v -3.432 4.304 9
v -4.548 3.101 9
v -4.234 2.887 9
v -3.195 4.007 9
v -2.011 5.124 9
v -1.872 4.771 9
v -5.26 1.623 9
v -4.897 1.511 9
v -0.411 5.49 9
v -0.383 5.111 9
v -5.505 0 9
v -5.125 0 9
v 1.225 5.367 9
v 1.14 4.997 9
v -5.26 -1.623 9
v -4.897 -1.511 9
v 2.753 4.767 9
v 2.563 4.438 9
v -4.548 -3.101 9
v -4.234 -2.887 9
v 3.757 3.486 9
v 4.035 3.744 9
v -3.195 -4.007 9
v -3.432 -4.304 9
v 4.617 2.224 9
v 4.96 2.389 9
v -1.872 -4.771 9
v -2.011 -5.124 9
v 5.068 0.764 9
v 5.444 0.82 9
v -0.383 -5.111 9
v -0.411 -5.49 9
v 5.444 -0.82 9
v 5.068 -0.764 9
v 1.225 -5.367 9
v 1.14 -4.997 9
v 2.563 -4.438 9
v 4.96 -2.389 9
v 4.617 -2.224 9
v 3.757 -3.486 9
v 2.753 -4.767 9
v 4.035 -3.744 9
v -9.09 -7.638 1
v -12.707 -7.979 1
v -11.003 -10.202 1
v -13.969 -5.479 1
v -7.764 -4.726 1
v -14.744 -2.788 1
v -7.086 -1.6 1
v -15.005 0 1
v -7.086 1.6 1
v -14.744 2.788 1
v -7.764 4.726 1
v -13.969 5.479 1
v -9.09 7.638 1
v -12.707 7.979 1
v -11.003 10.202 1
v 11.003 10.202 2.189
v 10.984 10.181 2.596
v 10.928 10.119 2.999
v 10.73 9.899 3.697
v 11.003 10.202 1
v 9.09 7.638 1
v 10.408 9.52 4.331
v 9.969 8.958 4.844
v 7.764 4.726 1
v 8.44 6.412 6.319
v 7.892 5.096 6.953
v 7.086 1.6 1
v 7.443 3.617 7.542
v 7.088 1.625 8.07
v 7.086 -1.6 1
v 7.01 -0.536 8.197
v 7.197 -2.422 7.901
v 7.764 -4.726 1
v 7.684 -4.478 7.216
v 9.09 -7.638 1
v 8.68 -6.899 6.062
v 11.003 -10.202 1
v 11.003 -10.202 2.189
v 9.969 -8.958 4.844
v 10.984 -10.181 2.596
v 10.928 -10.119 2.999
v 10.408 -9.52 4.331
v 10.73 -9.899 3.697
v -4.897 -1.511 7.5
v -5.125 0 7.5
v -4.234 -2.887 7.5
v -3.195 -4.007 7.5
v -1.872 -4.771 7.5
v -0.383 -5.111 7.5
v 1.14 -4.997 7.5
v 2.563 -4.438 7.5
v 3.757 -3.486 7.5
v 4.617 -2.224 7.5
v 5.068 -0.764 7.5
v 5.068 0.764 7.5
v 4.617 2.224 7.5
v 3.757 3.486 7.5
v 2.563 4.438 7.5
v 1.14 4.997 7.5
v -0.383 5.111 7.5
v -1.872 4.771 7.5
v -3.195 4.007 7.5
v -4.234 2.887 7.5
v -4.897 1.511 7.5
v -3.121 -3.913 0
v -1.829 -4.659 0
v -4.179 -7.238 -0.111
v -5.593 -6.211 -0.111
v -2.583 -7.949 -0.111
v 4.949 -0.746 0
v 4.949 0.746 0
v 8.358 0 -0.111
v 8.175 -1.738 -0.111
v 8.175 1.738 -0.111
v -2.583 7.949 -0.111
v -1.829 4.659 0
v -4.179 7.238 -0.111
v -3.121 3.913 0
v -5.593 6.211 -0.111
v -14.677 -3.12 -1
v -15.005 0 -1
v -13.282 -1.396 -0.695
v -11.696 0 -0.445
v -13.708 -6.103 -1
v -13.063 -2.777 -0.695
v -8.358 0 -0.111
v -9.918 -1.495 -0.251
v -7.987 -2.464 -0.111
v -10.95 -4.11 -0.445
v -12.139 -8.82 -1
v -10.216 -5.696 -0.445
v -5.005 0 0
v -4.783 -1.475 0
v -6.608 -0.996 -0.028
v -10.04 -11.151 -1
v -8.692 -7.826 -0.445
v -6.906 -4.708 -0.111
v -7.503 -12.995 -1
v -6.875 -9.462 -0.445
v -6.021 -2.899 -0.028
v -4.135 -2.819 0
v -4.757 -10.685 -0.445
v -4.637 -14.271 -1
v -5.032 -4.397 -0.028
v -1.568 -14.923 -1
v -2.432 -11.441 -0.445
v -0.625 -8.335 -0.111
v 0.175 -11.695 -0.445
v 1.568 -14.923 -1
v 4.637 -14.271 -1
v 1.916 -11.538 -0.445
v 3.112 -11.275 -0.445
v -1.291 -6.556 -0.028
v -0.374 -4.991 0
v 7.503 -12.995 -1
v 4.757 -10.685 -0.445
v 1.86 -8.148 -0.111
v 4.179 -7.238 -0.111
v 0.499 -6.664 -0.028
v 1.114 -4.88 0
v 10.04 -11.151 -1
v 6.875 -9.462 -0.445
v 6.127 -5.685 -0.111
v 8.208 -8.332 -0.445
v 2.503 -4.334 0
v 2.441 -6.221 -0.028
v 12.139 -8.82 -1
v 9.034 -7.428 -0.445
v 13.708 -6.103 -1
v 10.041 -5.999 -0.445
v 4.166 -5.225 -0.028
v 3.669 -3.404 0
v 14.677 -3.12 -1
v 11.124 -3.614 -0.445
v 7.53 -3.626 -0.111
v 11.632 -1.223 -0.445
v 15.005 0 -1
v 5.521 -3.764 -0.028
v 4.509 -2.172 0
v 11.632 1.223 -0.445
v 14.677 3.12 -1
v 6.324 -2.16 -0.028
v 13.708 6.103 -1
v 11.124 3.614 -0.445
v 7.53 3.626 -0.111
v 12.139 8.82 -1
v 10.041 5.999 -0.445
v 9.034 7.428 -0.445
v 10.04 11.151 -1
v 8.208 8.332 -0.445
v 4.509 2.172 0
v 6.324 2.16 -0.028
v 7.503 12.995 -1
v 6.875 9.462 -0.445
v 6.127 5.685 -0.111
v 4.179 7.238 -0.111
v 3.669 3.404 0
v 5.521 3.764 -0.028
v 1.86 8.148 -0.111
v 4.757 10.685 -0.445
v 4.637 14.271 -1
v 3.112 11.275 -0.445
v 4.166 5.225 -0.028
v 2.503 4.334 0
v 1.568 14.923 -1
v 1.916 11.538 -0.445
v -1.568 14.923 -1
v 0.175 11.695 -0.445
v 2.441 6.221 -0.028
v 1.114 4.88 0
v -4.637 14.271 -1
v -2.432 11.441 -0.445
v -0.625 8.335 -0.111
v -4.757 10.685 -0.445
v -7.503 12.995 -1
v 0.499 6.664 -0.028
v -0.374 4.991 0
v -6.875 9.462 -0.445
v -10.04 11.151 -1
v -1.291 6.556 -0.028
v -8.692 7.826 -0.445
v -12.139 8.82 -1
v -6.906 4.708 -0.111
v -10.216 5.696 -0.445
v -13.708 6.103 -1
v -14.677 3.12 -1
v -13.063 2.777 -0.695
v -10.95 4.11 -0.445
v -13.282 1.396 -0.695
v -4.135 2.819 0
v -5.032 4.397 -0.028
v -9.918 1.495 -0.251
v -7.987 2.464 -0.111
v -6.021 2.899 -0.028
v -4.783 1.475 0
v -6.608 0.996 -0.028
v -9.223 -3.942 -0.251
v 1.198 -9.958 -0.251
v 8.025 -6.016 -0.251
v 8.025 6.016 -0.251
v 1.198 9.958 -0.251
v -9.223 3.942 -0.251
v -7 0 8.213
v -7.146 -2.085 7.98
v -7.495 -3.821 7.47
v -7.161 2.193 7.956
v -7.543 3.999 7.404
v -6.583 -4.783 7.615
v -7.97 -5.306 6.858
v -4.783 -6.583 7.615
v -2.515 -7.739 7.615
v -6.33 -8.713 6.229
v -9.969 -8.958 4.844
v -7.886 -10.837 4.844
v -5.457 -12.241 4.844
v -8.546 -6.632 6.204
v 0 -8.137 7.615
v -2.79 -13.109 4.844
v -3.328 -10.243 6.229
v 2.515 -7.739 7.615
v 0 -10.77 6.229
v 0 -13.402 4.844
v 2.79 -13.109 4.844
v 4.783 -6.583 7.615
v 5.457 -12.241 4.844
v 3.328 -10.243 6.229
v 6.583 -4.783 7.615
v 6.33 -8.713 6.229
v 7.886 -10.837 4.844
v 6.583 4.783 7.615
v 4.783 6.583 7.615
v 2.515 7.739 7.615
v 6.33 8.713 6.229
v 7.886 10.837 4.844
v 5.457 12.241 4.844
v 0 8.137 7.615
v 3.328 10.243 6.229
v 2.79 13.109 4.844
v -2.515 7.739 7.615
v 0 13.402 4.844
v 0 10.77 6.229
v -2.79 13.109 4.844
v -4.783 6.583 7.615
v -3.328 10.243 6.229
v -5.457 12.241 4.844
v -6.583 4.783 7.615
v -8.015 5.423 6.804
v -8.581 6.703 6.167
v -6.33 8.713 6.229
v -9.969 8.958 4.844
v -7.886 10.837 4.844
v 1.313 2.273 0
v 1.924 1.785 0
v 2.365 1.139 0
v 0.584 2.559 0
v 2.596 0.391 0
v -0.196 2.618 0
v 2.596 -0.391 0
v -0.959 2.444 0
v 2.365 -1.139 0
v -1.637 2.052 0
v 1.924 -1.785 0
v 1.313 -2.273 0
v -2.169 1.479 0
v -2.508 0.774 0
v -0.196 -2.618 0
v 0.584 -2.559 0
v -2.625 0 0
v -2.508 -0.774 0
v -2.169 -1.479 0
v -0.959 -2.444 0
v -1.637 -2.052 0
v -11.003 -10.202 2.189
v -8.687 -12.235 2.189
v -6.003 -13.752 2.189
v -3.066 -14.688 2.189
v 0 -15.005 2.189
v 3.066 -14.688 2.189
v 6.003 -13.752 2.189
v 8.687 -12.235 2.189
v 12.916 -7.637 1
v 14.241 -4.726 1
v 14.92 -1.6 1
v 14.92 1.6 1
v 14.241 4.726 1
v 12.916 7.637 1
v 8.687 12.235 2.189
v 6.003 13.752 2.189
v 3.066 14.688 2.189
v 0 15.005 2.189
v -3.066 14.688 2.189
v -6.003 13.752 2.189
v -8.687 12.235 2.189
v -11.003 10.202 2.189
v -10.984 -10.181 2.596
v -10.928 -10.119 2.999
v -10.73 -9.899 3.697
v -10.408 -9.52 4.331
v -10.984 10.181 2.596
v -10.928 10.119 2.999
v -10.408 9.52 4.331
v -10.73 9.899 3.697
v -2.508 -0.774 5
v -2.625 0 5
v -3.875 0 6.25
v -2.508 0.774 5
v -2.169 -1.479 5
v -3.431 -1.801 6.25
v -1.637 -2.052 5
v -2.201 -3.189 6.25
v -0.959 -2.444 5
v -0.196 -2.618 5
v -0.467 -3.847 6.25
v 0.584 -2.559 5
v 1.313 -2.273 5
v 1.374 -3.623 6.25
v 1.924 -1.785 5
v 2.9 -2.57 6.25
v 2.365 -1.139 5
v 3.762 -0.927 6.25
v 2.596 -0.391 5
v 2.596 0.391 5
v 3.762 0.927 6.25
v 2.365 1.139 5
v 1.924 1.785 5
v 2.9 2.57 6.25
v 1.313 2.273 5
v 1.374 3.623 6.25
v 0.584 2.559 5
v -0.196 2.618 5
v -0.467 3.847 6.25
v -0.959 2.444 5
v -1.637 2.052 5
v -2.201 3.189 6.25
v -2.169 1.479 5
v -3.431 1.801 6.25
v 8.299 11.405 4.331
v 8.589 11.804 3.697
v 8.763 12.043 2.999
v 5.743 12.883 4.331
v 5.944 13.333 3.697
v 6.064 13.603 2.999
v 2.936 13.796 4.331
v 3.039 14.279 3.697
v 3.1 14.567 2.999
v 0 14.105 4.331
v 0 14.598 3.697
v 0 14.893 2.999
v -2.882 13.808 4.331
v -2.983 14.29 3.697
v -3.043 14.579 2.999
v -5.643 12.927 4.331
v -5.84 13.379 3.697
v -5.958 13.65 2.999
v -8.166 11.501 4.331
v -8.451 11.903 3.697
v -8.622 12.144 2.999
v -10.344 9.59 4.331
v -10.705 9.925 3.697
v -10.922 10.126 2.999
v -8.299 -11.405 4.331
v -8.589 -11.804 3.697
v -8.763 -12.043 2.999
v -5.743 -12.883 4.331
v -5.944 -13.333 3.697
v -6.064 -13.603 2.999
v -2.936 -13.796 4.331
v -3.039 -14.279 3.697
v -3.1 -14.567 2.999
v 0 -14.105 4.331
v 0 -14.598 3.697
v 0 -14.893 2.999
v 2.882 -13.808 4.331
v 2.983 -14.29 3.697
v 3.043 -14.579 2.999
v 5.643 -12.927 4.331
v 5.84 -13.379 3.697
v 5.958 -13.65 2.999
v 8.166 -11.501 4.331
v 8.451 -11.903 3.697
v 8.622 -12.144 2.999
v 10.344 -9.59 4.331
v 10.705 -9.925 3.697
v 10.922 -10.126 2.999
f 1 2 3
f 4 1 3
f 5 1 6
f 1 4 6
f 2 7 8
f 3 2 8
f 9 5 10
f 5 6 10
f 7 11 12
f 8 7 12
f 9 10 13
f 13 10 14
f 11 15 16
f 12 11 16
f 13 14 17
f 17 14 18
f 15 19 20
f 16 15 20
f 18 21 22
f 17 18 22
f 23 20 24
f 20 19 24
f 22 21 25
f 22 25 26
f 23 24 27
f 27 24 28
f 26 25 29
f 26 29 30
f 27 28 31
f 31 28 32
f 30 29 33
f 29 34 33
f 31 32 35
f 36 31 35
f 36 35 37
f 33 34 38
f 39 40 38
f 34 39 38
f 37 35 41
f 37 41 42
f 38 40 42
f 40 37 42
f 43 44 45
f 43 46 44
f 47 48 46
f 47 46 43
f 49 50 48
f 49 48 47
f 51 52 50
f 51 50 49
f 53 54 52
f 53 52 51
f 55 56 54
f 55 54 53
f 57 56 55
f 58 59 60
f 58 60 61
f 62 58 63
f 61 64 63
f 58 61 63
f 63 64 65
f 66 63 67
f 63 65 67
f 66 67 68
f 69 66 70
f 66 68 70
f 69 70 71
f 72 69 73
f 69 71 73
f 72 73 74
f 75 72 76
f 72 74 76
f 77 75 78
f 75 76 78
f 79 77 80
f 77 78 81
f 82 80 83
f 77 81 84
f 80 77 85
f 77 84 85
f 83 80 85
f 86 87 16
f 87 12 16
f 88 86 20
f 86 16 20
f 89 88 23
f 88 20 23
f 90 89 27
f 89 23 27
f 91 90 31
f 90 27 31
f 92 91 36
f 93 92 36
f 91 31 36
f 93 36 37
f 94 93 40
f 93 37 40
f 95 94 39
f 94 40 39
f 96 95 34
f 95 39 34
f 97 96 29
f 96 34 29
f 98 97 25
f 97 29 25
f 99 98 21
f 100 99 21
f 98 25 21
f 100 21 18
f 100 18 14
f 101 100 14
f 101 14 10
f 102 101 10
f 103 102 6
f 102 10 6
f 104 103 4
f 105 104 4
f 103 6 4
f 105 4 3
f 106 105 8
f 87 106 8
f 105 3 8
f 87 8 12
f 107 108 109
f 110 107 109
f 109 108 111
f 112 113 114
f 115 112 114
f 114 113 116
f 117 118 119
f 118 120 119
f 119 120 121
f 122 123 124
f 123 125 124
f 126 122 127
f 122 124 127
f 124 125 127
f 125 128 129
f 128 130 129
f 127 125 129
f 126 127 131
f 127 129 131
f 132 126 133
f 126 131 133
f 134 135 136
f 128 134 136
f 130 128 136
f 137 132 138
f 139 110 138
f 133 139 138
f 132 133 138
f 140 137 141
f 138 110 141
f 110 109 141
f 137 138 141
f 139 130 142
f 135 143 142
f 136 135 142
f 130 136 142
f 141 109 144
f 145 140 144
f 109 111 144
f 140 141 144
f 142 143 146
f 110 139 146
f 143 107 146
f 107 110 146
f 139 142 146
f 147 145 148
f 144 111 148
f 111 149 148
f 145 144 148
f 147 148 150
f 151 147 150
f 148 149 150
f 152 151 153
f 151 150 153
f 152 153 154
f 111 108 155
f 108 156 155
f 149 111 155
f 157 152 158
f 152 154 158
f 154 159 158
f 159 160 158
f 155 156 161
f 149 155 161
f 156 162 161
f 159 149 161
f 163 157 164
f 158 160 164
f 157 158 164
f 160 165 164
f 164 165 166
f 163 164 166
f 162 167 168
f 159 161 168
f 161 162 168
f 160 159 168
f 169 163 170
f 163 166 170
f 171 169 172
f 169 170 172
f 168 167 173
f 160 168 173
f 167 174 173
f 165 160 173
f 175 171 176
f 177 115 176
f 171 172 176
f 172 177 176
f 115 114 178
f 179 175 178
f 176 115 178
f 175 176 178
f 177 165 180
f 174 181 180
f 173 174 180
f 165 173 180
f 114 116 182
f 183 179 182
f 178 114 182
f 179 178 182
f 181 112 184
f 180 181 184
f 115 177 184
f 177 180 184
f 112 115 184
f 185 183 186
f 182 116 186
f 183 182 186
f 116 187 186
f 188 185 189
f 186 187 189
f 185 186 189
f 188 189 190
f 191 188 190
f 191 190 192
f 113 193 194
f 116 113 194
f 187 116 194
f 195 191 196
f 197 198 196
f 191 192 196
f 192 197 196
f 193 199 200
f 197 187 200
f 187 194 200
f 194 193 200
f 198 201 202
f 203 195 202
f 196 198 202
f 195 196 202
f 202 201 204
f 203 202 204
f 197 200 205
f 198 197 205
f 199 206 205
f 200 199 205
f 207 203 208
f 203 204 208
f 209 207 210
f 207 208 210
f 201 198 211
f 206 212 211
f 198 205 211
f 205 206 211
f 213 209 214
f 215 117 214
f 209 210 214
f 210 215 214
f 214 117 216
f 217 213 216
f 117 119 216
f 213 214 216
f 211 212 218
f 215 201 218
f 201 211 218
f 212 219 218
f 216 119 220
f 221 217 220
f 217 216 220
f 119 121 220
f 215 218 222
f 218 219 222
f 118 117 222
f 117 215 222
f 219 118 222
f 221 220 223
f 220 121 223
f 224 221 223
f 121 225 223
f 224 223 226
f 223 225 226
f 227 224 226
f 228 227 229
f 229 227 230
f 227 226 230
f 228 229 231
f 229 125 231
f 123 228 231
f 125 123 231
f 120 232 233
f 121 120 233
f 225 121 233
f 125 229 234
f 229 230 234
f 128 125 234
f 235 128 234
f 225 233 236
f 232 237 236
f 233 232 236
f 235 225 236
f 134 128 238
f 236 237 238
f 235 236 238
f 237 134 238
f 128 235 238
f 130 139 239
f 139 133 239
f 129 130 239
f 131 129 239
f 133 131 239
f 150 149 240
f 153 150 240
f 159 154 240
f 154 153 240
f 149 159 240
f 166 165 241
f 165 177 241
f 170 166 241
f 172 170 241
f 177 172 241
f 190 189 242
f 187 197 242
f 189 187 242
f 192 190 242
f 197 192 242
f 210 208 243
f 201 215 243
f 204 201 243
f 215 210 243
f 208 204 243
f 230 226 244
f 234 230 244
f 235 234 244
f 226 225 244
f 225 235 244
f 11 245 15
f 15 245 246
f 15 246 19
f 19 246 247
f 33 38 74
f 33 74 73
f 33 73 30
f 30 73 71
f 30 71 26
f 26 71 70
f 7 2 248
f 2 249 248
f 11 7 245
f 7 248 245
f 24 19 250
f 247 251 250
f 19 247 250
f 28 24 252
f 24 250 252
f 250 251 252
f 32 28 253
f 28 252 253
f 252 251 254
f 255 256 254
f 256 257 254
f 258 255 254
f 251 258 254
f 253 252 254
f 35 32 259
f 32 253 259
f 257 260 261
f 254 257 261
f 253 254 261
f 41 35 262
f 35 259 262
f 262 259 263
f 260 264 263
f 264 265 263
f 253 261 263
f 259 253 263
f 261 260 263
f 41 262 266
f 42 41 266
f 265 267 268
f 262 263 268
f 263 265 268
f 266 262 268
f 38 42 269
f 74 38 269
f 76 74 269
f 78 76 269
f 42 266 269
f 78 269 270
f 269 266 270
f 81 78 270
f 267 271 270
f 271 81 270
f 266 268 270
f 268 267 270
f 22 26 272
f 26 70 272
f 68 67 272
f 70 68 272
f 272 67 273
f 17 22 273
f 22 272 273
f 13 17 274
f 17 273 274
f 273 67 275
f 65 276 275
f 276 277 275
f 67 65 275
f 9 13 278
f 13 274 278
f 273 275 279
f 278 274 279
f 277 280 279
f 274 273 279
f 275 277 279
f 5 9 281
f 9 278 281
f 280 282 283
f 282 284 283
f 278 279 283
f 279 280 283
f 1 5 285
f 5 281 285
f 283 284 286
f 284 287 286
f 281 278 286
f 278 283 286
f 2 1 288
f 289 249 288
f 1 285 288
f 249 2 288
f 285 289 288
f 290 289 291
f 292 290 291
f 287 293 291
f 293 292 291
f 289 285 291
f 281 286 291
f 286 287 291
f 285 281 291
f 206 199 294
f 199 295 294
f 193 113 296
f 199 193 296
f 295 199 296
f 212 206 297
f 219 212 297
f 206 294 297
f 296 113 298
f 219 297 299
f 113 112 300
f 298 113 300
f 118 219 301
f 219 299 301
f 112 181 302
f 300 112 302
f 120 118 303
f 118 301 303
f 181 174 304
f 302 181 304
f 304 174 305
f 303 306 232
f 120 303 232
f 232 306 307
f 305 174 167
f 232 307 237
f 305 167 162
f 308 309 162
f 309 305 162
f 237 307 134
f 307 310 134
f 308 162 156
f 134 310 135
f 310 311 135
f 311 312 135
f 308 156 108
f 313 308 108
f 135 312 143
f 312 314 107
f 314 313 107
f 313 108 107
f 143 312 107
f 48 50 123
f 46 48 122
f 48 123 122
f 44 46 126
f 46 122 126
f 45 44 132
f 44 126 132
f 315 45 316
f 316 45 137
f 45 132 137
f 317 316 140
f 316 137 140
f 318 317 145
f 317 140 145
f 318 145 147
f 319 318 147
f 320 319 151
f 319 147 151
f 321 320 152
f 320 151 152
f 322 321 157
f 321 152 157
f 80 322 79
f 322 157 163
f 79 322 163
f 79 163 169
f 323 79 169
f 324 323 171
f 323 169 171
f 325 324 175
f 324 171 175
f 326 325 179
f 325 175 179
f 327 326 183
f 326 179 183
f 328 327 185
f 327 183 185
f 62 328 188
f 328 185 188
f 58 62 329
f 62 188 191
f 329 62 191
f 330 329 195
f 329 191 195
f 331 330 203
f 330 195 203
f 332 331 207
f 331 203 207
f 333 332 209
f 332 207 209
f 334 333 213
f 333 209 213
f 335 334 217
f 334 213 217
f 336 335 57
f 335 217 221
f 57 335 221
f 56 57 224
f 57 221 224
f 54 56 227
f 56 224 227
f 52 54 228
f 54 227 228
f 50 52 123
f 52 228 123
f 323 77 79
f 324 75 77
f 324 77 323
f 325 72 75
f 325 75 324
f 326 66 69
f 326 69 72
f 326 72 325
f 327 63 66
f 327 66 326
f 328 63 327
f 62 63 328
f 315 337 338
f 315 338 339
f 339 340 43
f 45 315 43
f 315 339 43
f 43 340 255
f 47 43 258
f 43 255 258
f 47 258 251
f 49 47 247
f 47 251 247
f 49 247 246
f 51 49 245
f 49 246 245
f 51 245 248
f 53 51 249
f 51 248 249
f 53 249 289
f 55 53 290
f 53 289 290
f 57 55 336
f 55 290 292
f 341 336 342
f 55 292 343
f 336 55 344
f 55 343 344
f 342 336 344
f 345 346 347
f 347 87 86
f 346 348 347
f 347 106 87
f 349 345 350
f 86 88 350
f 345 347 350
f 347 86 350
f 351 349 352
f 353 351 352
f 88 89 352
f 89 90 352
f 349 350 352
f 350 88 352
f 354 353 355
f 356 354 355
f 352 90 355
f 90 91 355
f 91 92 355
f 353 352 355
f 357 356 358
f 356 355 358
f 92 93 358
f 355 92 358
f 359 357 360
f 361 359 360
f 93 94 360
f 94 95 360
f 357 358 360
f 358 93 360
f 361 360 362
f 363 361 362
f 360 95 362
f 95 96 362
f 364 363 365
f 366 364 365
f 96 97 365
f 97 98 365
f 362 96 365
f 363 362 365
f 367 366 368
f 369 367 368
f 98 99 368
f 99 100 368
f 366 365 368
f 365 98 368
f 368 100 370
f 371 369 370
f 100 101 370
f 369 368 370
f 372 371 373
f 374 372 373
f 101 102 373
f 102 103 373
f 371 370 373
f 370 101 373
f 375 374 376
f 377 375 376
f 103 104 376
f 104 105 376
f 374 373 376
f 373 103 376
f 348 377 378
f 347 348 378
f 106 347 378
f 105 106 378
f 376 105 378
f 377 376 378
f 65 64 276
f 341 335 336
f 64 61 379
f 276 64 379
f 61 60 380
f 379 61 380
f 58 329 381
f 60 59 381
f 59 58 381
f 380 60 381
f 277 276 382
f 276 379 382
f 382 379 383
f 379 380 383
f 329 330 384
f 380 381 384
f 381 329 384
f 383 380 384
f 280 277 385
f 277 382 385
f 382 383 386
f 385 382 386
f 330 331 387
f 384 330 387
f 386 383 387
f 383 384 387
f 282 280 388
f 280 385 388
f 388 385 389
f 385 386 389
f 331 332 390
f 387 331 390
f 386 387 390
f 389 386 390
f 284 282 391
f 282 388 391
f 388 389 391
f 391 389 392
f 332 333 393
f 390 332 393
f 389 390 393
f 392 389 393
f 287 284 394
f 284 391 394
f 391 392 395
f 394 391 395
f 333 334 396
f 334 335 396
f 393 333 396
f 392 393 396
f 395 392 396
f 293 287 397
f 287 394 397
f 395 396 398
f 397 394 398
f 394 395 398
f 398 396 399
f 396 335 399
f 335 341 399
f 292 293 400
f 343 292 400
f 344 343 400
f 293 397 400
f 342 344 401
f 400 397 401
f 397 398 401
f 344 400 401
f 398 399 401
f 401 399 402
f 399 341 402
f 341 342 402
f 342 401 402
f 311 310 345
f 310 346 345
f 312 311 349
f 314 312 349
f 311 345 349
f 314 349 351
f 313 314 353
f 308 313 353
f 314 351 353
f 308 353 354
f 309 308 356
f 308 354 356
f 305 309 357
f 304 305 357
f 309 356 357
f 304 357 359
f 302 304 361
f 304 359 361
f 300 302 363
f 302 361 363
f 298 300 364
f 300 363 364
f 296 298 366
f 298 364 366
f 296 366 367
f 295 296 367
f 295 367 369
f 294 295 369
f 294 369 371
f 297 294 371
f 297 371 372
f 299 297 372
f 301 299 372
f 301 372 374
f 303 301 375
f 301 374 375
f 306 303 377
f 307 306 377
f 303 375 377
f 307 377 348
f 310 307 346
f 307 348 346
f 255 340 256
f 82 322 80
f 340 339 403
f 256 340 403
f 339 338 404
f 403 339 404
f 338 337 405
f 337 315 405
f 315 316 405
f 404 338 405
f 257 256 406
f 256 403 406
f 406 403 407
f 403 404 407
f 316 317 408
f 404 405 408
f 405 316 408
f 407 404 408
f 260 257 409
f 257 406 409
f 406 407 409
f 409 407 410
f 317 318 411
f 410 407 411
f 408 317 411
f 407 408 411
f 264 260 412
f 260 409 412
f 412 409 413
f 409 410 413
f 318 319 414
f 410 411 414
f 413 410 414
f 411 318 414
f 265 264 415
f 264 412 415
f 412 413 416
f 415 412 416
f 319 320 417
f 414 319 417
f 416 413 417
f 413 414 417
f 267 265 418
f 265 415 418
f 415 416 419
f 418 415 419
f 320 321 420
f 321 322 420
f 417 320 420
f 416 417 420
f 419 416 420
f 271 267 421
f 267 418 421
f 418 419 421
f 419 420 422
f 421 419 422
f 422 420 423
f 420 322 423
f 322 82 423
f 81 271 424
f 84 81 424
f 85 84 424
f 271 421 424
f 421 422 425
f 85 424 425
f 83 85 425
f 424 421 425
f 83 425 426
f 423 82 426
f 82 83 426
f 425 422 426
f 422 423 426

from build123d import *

# Parameters (mm, degrees)
F2_R     = 15
F3_DEPTH = 8


with BuildPart() as f1:
    # F0 (on Front) → F1 (revolve)
    with BuildSketch(Plane.XZ):
        with BuildLine():
            Line((-2.625, 0), (-2.625, 5))
            Line((-2.625, 5), (-5.125, 7.5))
            Line((-5.125, 7.5), (-5.125, 9))
            Line((-5.125, 9), (-5.505, 9))
            Line((-5.505, 9), (-13.402239, 4.843558))
            ThreePointArc((-13.402239, 4.843558), (-14.57324, 3.739333), (-15.005, 2.188804))
            Line((-15.005, 2.188804), (-15.005, -1))
            ThreePointArc((-15.005, -1), (-10.029938, -0.250622), (-5.005, 0))
            Line((-5.005, 0), (-2.625, 0))
        make_face()
    revolve(axis=Axis((0, 0, 10.827172), (0, 0, 1)))

    # F2 (on face) → F3 (cut)
    with BuildSketch(Plane.XY.offset(9)):
        with Locations((-22, 0)):
            Circle(F2_R)
        with Locations((22, 0)):
            Circle(F2_R)
    extrude(amount=-F3_DEPTH, mode=Mode.SUBTRACT)


solid = f1.part
